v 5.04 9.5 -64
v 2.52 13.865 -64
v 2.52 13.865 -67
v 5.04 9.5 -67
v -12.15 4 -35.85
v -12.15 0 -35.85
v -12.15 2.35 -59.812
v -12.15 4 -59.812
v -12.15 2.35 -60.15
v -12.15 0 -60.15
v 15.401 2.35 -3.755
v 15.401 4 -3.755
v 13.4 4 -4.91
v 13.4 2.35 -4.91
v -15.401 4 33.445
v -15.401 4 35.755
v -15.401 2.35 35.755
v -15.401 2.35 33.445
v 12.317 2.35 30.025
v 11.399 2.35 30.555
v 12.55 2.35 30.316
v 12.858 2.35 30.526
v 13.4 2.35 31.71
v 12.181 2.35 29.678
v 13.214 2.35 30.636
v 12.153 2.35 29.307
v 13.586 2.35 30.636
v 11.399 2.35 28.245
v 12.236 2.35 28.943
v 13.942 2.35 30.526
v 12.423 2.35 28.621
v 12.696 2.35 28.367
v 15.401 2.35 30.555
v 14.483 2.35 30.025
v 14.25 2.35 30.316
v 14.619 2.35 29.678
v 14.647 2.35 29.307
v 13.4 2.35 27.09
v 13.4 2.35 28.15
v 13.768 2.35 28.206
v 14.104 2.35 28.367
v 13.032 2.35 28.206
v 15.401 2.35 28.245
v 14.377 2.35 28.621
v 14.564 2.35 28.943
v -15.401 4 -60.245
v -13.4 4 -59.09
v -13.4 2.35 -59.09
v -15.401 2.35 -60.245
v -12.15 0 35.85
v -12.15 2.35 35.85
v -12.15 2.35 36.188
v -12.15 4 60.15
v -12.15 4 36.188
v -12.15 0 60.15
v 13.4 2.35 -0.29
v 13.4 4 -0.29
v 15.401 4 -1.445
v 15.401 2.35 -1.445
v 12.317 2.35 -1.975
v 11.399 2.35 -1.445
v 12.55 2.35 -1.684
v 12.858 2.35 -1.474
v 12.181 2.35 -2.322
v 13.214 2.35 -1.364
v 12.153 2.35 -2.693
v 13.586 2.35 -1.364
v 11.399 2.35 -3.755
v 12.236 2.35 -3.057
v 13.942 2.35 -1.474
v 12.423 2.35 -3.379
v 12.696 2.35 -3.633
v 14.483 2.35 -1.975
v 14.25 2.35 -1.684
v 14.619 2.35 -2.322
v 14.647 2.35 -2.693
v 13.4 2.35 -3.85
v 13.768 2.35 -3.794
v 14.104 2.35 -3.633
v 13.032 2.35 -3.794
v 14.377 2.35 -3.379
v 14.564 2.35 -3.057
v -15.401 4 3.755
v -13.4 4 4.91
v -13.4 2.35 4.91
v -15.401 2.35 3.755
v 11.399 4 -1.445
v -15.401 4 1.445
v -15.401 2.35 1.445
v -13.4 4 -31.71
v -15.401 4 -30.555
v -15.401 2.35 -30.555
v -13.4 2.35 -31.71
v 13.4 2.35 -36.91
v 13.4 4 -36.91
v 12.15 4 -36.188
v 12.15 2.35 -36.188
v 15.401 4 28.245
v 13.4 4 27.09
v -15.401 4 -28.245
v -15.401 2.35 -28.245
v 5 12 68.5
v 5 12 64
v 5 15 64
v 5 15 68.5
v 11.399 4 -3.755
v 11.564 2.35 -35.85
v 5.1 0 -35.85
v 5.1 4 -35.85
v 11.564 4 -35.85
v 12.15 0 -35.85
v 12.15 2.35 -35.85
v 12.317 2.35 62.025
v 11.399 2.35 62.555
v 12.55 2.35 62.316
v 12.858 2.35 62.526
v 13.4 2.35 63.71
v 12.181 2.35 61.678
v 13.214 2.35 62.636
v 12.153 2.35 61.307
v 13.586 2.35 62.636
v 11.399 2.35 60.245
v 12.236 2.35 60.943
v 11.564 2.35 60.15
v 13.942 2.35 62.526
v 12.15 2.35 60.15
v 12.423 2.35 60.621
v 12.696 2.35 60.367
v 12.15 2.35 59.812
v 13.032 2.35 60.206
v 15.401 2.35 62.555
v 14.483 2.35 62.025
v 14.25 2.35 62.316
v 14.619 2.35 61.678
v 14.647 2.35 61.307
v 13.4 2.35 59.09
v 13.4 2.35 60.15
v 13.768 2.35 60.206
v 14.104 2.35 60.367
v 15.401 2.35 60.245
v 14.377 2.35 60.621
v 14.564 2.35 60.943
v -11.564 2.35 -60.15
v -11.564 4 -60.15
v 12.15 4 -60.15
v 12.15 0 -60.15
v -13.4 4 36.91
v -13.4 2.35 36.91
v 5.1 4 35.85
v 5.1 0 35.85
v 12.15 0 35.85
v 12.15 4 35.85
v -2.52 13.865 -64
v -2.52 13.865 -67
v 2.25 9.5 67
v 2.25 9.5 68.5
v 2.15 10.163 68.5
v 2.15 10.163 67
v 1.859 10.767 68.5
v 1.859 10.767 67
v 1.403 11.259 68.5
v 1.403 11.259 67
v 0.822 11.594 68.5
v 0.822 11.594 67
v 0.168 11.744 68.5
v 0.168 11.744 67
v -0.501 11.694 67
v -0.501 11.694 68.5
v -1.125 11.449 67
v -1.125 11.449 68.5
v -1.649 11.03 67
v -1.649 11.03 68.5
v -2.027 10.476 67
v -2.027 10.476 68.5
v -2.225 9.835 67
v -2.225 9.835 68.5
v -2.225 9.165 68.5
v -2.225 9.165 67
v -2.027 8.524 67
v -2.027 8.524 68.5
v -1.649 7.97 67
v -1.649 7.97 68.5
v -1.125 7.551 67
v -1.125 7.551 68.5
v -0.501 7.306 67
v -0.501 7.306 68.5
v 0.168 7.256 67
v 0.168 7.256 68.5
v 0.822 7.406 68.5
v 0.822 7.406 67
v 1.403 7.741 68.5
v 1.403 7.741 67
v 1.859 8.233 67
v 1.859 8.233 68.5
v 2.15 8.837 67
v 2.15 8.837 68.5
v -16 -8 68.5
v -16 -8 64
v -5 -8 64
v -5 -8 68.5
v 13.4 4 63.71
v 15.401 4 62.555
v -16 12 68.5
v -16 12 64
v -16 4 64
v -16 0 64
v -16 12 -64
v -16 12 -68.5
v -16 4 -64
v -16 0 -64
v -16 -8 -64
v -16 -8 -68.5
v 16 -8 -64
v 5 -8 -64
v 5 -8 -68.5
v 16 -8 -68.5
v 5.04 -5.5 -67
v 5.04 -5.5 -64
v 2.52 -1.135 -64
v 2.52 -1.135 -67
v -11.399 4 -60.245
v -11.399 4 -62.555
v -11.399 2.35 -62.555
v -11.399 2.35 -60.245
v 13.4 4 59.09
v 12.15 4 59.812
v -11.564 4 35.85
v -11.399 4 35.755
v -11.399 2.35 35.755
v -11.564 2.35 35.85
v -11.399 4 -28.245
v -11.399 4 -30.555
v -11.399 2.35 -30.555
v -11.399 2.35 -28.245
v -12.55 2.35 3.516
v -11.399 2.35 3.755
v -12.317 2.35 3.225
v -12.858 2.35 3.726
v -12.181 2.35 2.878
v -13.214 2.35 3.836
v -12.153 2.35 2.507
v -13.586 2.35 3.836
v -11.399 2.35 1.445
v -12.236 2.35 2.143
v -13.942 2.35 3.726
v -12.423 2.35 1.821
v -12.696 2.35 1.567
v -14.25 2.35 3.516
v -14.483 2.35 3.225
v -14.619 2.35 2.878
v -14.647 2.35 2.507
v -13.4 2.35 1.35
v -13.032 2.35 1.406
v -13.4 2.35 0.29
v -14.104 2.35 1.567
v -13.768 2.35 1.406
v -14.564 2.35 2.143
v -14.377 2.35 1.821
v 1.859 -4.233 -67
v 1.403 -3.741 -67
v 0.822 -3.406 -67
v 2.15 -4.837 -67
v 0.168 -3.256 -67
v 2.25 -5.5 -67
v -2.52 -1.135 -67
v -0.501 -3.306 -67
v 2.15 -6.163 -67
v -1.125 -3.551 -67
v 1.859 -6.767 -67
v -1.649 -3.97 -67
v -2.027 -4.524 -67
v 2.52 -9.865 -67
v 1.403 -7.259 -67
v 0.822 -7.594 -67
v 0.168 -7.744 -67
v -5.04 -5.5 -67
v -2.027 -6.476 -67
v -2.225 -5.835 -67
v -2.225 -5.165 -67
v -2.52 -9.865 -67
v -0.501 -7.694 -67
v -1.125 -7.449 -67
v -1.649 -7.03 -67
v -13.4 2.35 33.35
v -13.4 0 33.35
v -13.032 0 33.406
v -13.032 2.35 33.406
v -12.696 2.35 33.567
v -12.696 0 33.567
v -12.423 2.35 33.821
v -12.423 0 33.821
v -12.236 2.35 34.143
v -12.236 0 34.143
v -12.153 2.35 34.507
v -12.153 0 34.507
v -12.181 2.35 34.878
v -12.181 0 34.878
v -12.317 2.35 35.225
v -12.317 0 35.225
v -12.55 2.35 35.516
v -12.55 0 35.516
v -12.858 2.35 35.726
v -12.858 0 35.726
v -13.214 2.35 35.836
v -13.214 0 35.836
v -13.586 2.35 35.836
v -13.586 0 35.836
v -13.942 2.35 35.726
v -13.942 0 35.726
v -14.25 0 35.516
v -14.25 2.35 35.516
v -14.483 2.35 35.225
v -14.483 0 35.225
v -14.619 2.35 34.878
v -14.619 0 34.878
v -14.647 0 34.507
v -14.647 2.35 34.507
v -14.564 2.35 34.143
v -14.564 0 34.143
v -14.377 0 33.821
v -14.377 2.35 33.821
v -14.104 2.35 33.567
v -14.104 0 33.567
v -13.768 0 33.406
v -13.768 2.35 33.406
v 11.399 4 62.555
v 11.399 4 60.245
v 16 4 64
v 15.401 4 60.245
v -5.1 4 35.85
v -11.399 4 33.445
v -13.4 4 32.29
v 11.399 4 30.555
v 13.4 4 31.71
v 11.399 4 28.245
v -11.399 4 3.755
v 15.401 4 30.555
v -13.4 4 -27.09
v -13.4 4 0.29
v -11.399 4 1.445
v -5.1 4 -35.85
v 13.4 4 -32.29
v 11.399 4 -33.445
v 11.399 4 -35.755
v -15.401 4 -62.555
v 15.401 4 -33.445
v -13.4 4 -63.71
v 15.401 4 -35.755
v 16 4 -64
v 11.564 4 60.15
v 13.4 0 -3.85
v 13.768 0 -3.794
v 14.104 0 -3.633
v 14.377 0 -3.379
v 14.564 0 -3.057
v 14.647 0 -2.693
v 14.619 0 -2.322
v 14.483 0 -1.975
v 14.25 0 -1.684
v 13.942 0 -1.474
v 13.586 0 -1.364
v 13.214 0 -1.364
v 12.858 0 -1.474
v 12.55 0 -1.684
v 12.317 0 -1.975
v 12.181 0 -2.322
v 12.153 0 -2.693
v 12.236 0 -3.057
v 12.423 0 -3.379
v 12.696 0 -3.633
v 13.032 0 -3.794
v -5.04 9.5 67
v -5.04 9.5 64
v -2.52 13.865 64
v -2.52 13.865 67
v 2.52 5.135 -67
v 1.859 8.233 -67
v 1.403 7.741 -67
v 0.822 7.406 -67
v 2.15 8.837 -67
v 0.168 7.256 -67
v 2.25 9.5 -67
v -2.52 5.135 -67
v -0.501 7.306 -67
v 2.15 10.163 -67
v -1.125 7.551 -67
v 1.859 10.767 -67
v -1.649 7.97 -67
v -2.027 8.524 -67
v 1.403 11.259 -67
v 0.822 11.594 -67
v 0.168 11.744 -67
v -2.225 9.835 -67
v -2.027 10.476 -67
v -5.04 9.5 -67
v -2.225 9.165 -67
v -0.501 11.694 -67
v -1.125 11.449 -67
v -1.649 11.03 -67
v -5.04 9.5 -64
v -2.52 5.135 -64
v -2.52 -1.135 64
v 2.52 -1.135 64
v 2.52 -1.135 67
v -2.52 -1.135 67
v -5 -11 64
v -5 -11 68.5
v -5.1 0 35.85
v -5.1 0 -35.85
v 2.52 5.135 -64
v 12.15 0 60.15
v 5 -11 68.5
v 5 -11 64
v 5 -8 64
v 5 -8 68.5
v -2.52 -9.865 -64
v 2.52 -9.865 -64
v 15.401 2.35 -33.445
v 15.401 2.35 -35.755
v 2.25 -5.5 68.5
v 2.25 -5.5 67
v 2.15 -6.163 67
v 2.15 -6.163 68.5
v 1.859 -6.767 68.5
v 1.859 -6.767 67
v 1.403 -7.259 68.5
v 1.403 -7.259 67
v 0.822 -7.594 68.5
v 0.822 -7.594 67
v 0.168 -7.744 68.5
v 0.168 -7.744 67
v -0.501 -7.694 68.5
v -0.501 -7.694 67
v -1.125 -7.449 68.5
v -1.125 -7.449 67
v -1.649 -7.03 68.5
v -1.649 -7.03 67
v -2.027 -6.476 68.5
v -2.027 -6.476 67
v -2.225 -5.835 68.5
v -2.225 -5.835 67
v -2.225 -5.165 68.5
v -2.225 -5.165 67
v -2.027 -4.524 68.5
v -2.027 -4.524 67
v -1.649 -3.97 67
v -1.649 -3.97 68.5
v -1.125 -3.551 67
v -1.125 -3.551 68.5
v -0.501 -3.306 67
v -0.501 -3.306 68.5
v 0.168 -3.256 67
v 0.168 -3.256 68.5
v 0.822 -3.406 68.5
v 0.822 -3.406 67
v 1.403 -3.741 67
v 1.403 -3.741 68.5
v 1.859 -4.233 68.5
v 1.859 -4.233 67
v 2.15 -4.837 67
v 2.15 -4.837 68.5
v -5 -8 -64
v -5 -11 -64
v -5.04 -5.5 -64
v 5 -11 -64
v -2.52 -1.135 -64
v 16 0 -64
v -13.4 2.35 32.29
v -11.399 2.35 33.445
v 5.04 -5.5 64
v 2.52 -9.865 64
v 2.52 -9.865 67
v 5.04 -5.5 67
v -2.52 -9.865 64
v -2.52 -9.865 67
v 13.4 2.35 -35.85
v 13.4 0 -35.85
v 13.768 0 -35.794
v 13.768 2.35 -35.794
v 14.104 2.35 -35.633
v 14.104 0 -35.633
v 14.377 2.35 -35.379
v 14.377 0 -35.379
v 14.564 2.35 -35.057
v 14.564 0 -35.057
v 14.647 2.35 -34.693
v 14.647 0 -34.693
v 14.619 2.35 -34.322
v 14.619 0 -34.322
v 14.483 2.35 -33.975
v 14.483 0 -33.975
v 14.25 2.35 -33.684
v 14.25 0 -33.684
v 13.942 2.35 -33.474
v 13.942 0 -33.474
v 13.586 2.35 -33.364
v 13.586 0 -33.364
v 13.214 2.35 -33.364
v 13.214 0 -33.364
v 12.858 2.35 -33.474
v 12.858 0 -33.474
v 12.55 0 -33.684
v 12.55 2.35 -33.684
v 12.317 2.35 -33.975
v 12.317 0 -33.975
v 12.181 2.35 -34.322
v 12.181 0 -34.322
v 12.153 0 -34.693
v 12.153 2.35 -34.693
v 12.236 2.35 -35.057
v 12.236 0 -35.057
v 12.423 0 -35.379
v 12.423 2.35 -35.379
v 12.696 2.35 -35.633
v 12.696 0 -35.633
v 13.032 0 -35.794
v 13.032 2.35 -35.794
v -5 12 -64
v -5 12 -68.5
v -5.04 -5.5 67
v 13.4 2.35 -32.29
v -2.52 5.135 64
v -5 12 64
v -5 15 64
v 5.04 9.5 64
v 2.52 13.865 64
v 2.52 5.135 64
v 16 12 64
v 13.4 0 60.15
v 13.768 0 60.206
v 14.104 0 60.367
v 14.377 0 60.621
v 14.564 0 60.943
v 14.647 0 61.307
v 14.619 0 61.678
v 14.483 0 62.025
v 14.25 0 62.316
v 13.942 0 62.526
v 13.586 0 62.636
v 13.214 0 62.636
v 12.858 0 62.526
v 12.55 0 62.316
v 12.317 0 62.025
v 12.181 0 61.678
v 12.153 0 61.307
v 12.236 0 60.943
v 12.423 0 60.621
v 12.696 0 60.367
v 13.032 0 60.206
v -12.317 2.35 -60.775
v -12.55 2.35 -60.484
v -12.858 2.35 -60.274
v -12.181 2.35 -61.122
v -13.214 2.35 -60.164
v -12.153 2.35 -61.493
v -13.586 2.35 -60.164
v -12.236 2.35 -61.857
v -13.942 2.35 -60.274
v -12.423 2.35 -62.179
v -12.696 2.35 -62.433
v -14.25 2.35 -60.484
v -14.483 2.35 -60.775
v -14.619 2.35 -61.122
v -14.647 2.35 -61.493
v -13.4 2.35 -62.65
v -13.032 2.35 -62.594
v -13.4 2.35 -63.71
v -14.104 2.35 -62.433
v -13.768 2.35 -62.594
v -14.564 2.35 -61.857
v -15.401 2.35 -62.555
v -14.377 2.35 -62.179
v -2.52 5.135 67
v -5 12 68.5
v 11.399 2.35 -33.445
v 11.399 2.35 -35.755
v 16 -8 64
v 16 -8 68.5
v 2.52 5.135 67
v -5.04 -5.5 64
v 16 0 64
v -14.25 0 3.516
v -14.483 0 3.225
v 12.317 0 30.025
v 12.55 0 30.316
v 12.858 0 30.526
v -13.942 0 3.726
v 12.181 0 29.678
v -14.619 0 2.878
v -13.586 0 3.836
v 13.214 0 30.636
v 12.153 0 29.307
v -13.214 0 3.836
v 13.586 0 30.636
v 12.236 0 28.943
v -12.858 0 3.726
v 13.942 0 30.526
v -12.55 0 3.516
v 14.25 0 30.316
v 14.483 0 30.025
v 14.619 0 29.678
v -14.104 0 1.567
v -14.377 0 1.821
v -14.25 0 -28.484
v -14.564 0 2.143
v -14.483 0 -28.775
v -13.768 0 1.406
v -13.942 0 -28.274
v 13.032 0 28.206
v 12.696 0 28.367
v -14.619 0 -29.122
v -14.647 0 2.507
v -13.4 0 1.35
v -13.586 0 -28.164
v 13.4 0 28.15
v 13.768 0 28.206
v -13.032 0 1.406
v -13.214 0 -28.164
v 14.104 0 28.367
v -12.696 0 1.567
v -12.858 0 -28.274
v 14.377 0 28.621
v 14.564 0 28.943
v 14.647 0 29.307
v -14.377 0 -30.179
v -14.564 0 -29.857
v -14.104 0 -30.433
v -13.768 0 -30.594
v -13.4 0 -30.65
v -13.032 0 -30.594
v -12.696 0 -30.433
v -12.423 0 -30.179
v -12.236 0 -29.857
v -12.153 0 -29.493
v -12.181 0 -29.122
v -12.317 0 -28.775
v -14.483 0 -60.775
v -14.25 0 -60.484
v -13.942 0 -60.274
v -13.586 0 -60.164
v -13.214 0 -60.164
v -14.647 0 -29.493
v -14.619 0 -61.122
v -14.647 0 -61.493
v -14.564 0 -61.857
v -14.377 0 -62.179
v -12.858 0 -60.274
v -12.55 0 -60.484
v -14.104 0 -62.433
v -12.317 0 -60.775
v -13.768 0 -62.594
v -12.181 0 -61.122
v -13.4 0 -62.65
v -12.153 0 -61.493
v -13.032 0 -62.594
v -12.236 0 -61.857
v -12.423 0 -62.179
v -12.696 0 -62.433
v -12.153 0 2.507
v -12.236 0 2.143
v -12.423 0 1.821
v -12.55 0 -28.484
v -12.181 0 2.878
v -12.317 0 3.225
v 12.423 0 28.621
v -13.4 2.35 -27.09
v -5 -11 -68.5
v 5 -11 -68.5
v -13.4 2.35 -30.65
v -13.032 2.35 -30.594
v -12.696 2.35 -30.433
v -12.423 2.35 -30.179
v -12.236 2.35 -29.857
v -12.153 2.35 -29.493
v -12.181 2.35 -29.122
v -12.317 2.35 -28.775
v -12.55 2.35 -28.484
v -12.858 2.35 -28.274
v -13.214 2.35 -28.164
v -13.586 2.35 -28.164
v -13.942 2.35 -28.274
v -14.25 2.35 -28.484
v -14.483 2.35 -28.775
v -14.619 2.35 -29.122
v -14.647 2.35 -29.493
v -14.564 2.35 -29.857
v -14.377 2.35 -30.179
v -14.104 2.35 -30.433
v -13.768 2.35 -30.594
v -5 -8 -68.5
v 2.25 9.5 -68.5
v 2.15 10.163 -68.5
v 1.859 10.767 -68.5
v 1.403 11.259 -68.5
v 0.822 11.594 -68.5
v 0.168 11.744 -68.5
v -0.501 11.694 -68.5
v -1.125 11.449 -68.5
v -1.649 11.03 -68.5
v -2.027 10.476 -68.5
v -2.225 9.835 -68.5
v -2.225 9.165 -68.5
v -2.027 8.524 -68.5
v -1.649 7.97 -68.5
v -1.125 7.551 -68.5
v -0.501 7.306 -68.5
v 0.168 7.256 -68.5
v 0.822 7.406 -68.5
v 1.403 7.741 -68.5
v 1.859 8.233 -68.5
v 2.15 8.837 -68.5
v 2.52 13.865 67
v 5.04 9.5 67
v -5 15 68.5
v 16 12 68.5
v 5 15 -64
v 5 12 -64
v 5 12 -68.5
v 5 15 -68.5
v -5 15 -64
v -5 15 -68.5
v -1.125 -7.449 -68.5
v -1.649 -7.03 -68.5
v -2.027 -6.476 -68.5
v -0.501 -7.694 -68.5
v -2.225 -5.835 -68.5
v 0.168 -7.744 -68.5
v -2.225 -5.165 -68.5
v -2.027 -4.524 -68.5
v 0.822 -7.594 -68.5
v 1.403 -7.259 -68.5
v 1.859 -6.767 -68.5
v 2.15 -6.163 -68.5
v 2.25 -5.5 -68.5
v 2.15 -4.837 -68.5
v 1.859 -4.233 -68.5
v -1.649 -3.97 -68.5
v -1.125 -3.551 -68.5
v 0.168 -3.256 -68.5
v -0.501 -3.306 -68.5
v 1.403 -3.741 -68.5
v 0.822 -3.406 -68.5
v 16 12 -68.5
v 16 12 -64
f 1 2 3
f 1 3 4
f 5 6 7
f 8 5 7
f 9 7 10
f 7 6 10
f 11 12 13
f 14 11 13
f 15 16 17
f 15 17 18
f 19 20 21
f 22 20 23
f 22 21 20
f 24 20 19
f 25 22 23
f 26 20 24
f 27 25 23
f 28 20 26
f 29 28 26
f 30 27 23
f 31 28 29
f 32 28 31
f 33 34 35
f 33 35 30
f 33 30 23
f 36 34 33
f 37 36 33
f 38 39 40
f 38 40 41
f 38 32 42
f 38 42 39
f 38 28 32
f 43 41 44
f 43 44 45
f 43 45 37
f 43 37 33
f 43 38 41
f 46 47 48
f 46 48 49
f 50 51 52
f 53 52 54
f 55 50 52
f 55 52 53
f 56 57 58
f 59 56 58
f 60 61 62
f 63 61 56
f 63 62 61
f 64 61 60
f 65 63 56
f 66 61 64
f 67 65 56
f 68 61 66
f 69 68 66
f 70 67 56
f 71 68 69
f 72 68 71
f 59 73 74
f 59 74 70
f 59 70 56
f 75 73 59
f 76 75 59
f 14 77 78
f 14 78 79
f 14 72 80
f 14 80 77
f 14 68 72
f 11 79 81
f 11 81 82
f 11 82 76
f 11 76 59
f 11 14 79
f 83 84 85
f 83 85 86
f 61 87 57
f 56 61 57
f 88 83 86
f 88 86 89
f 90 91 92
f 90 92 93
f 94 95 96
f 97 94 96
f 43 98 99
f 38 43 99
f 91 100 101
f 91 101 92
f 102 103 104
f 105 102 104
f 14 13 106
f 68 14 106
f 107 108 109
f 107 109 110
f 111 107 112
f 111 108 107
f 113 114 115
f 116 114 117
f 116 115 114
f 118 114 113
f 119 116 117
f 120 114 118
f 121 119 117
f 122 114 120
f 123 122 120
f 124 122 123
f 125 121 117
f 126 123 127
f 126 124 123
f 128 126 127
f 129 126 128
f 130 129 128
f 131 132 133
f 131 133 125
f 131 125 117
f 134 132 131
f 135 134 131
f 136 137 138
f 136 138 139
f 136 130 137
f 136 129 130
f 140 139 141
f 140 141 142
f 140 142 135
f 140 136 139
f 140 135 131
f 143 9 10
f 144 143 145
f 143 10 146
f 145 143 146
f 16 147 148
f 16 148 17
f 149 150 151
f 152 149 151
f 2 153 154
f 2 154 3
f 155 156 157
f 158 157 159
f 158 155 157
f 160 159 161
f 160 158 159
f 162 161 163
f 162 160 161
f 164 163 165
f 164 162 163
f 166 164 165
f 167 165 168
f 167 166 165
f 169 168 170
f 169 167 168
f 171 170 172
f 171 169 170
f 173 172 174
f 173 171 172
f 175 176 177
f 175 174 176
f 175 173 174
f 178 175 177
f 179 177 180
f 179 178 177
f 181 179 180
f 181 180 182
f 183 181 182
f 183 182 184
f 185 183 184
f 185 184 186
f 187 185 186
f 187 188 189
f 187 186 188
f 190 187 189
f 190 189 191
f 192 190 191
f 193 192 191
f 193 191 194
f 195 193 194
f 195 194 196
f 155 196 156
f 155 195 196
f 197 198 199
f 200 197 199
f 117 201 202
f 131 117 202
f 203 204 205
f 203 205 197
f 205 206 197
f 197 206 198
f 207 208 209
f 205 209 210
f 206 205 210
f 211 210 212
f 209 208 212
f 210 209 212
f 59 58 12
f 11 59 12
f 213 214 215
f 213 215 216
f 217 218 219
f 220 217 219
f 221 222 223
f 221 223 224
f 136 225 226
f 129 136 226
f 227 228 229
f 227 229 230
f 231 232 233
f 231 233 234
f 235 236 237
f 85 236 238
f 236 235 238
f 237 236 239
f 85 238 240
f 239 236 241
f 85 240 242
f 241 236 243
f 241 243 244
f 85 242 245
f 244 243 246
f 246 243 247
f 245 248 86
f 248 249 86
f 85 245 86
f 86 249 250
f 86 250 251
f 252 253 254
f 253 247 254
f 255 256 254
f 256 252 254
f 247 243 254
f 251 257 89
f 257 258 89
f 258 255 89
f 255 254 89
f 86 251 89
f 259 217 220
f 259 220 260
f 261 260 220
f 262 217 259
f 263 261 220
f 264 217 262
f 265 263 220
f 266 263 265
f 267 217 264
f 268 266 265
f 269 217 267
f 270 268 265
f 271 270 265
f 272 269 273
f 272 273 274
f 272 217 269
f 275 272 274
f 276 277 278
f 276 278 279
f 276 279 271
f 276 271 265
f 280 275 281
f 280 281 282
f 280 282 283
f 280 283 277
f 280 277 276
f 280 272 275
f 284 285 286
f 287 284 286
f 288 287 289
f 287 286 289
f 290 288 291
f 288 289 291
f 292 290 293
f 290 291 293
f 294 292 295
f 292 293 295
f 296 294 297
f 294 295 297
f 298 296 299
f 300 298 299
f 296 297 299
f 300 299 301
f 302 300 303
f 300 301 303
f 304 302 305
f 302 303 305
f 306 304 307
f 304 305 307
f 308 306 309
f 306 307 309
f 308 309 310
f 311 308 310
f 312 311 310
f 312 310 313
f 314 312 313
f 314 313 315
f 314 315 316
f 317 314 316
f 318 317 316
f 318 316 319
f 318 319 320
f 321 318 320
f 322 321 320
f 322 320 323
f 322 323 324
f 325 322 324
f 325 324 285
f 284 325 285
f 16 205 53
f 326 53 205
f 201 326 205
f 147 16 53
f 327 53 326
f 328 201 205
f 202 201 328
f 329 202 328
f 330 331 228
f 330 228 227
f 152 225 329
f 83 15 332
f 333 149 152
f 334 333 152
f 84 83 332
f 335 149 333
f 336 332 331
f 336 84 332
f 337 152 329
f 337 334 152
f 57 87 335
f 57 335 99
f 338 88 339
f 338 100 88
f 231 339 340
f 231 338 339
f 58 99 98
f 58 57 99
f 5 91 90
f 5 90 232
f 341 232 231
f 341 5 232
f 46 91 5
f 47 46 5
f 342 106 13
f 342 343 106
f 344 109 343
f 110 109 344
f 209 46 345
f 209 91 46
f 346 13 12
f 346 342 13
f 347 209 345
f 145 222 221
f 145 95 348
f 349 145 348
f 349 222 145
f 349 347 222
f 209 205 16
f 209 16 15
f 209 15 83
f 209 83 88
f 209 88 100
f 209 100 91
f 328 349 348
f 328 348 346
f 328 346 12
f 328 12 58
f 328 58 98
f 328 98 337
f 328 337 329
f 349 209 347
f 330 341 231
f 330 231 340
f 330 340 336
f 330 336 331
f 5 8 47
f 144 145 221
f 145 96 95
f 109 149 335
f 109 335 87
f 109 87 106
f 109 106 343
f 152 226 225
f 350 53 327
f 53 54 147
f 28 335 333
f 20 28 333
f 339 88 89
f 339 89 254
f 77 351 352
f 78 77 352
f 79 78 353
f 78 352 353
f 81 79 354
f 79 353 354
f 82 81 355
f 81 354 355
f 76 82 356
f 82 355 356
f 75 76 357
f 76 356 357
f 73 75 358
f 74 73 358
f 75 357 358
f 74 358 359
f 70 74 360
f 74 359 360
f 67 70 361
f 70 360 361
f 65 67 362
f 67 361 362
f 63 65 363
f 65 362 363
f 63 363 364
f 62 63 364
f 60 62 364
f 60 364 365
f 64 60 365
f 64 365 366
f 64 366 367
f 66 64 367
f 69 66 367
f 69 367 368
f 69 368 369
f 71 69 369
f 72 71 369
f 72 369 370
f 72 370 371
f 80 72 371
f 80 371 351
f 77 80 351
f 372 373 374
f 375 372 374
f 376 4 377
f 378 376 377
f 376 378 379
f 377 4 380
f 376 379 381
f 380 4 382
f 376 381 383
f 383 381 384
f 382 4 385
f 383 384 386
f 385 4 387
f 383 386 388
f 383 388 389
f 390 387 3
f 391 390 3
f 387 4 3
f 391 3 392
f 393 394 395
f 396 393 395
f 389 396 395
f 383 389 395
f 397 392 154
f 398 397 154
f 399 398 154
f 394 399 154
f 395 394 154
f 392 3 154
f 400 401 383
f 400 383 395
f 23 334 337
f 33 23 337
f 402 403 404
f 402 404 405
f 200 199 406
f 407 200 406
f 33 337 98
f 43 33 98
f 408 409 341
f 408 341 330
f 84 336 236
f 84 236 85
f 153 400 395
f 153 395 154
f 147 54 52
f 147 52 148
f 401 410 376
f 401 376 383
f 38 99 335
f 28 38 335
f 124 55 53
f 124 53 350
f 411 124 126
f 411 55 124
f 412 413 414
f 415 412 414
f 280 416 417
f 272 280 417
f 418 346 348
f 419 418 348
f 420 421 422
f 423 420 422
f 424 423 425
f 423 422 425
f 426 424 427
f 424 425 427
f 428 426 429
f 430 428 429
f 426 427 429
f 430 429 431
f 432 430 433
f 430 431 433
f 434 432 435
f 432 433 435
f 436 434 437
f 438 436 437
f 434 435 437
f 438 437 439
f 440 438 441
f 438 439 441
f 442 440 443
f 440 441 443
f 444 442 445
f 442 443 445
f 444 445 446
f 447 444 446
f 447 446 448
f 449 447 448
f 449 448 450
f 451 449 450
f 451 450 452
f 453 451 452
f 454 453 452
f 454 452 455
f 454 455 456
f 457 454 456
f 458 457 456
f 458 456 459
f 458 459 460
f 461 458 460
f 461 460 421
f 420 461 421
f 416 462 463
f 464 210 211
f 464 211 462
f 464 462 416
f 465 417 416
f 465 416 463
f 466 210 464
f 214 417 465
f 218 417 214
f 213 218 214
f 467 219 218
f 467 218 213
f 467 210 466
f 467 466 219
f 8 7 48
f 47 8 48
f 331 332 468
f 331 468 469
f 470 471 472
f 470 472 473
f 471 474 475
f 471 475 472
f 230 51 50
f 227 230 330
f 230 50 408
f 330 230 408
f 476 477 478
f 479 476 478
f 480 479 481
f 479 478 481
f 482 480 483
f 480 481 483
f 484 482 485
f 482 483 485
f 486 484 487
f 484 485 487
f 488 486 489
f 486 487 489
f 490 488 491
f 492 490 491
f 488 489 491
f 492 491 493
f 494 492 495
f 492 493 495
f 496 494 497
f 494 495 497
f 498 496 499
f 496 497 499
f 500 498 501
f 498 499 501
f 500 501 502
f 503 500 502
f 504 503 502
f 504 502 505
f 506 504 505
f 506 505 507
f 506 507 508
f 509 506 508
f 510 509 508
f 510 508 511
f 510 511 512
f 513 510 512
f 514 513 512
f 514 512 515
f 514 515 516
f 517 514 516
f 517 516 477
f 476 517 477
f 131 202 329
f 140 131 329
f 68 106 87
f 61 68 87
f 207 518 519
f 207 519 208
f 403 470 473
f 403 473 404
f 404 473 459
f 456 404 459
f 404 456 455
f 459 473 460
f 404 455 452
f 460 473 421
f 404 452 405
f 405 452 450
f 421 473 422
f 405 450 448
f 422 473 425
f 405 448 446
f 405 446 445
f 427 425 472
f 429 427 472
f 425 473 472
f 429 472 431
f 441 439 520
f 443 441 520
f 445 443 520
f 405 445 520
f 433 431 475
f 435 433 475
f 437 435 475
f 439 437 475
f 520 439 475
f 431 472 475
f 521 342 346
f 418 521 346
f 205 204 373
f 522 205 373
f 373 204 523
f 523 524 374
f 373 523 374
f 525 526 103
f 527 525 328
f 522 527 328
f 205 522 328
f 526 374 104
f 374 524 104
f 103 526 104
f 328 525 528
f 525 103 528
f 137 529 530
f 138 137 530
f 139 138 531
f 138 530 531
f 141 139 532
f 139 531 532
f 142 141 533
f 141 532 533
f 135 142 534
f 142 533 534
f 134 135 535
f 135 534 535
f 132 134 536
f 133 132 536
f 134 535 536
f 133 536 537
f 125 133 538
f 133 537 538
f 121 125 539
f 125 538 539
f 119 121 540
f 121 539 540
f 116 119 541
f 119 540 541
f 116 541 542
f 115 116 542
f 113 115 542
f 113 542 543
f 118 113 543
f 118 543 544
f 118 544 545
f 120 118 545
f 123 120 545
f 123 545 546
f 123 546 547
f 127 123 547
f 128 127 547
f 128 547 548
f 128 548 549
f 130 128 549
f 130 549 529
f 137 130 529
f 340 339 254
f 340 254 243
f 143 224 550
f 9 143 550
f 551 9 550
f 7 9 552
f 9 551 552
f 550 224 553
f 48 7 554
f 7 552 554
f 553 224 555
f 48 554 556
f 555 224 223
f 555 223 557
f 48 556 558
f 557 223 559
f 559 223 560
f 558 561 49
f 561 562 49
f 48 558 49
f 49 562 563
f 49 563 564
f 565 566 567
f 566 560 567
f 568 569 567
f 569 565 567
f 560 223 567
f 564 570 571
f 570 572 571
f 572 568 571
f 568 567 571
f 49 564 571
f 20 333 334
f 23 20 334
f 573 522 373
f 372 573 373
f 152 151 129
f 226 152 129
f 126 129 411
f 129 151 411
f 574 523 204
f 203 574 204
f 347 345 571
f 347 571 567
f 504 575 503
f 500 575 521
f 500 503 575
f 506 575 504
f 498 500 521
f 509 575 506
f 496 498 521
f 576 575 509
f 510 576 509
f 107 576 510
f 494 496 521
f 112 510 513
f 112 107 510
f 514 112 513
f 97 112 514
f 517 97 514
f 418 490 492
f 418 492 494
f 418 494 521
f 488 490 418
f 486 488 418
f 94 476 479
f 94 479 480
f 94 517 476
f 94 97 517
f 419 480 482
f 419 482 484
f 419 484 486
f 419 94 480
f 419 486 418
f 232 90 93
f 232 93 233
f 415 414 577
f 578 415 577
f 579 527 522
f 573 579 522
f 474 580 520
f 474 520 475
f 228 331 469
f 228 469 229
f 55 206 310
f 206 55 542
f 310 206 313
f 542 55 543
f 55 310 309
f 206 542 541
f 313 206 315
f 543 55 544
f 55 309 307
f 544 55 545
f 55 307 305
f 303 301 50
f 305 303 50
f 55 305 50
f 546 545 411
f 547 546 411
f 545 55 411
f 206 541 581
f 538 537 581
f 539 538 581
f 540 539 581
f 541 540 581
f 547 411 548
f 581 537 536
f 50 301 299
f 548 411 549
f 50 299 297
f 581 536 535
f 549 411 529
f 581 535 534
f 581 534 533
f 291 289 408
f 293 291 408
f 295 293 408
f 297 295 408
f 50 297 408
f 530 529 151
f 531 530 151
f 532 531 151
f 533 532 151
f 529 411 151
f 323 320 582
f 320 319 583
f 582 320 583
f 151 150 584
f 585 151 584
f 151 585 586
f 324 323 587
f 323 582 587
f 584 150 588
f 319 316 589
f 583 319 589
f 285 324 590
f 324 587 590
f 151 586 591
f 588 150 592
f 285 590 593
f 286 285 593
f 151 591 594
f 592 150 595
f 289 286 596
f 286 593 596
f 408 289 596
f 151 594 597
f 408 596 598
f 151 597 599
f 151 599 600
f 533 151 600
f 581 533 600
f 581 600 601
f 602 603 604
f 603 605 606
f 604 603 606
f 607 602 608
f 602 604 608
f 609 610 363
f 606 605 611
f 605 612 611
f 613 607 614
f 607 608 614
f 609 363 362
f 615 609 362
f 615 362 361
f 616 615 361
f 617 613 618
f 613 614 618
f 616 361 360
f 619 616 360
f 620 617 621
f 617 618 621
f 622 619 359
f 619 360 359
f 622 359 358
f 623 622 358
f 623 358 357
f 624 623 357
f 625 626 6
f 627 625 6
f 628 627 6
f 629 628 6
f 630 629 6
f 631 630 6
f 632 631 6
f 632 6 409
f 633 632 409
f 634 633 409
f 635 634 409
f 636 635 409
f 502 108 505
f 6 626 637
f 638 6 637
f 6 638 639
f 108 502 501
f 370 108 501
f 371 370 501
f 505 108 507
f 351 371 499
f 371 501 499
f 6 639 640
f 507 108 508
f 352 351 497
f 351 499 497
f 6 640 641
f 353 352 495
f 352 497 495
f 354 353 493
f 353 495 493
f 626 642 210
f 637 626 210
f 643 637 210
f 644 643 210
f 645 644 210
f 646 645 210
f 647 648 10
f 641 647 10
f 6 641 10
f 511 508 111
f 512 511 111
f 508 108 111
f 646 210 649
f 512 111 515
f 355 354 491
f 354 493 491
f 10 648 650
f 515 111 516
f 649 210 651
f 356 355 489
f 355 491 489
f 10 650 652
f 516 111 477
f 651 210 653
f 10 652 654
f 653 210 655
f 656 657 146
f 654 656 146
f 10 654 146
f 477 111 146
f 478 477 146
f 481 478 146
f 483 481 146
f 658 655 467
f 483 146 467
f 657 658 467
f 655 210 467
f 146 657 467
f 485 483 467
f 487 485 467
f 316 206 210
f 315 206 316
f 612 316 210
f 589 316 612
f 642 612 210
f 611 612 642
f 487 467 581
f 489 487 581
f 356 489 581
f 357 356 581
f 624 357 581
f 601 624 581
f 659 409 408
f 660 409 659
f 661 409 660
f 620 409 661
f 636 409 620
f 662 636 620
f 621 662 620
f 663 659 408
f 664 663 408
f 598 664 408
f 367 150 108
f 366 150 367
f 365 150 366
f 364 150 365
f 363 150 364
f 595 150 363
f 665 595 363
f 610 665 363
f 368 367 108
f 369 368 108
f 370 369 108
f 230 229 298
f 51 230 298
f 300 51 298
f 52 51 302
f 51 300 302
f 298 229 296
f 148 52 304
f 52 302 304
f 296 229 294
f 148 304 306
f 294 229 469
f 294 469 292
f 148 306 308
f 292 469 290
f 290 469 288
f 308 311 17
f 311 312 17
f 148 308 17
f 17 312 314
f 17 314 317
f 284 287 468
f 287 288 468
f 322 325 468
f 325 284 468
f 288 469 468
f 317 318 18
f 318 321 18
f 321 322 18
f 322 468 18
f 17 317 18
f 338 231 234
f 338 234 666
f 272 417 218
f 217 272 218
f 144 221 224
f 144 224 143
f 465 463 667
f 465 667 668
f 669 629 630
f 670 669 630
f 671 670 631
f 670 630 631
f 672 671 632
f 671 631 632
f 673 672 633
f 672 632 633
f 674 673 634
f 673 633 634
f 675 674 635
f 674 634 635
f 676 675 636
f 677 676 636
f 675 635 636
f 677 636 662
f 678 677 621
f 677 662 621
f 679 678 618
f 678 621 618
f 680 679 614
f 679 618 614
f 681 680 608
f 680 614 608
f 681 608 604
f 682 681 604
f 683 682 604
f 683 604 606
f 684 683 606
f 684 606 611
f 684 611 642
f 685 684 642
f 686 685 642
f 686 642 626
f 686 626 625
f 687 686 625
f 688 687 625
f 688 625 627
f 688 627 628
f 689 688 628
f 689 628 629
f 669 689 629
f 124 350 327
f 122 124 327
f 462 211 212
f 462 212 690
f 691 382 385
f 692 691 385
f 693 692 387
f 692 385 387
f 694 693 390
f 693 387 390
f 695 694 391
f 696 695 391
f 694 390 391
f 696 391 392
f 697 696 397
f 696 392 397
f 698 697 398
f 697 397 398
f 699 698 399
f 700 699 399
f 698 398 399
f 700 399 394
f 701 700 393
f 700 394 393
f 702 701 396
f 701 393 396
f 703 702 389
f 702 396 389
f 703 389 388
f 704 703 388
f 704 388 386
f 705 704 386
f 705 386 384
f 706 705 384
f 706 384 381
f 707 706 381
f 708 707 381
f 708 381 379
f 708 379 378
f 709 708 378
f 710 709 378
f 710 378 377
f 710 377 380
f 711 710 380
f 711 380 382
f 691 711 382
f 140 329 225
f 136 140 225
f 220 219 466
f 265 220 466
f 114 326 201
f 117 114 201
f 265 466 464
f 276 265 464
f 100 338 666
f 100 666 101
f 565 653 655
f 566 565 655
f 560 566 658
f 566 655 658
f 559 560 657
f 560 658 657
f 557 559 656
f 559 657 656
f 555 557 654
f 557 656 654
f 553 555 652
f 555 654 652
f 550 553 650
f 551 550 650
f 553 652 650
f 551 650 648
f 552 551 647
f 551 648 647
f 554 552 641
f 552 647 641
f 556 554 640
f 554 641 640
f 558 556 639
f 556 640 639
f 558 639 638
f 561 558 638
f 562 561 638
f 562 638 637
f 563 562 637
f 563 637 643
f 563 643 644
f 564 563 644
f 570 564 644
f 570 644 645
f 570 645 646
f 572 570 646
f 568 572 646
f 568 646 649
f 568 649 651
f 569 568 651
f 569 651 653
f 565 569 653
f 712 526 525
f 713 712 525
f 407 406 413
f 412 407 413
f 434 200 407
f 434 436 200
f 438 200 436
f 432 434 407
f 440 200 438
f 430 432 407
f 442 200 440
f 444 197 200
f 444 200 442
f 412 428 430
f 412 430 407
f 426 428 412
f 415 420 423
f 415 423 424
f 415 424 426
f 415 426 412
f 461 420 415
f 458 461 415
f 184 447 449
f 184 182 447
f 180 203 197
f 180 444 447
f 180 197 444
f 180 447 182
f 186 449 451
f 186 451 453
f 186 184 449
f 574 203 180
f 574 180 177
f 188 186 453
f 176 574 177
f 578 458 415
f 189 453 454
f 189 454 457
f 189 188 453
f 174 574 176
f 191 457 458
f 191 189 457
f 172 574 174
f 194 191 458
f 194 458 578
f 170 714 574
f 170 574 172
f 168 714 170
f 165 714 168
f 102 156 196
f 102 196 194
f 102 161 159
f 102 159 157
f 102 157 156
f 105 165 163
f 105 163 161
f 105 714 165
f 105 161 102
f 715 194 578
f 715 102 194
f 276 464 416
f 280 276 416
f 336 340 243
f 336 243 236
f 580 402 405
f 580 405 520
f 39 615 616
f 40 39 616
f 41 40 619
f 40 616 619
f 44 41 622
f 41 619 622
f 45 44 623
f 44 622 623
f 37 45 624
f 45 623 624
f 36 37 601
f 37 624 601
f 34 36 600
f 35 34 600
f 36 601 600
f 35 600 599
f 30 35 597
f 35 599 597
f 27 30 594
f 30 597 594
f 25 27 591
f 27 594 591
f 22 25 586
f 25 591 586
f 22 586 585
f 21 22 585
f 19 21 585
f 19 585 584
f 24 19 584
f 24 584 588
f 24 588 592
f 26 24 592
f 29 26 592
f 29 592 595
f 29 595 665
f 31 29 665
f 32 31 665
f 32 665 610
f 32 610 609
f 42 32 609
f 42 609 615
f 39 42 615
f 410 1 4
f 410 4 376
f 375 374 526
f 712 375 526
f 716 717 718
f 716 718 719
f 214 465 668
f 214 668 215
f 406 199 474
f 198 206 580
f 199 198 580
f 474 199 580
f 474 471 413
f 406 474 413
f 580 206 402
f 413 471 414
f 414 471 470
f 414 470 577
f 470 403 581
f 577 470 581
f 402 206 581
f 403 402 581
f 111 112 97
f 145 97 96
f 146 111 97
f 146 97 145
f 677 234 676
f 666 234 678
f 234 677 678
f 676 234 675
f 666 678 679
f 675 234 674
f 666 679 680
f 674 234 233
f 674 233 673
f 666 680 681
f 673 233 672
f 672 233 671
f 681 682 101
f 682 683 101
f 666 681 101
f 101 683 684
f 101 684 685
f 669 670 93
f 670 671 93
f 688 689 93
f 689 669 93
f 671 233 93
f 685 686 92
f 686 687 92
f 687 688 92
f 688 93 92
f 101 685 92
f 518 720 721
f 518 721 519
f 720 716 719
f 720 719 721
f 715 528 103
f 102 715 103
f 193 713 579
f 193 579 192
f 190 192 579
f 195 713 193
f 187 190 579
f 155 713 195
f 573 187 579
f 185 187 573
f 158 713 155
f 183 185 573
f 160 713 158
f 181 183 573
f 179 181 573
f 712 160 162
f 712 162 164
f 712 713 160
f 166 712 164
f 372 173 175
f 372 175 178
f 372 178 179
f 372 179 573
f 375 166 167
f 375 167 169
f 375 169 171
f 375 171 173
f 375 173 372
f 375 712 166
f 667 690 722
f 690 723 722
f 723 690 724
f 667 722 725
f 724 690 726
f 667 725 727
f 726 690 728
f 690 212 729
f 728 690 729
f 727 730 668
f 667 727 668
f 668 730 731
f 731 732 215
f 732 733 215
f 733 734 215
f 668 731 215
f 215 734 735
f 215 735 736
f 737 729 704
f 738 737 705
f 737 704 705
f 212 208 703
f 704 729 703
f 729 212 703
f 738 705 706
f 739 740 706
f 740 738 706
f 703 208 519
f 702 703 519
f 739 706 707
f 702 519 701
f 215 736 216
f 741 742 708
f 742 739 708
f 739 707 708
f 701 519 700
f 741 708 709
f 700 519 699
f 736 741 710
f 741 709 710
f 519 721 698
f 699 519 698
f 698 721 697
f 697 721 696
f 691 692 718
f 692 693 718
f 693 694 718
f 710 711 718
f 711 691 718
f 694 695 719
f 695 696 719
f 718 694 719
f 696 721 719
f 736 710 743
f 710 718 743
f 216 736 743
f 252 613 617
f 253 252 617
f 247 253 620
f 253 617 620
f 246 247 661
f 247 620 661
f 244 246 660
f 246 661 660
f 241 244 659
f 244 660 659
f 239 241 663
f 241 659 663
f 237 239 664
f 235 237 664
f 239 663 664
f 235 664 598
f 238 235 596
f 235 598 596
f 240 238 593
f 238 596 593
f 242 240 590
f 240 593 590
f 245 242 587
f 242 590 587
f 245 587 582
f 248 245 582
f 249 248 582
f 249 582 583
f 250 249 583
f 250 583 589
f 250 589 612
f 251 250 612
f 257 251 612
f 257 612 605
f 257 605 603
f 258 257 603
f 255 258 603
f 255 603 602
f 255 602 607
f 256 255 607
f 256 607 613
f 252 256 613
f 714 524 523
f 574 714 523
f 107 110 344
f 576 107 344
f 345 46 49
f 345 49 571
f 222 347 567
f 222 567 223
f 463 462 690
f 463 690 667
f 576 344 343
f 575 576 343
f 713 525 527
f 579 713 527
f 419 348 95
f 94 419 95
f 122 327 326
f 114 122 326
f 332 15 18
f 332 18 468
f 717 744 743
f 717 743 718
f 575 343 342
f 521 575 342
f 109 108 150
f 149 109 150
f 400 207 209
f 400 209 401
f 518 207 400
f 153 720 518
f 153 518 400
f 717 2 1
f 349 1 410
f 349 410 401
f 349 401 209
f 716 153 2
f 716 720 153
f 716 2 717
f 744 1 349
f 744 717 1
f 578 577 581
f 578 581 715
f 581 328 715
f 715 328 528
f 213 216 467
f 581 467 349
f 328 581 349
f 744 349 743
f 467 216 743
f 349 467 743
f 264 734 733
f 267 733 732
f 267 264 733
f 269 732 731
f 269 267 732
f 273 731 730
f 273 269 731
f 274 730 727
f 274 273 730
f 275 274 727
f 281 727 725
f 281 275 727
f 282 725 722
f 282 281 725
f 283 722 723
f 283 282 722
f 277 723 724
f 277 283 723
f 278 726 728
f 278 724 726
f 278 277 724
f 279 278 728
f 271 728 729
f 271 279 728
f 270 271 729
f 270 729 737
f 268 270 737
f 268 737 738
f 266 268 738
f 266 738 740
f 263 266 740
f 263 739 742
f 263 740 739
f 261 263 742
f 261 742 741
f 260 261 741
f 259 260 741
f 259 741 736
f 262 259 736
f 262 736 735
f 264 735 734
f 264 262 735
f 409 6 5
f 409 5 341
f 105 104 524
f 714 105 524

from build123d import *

# Parameters (mm, degrees)
SKETCH1_W               = 32
SKETCH1_H               = 128
BOSS_EXTRUDE1_DEPTH     = 4
SKETCH4_R               = 1.25
CUT_EXTRUDE2_DEPTH      = 10
SKETCH5_R               = 1.25
CUT_EXTRUDE3_DEPTH      = 10
CUT_EXTRUDE4_DEPTH      = 1.65
LPATTERN3_COUNT         = 4
LPATTERN3_PITCH         = 32
CUT_EXTRUDE5_DEPTH      = 1.65
LPATTERN4_COUNT         = 4
LPATTERN4_PITCH         = 32
SKETCH8_W               = 24.3
SKETCH8_H               = 24.3
CUT_EXTRUDE6_DEPTH      = 10
BOSS_EXTRUDE2_DEPTH     = 4.5
SKETCH11_W              = 10.2
SKETCH11_H              = 71.7
CUT_EXTRUDE7_DEPTH      = 72.92530848
CUT_EXTRUDE8_DEPTH      = 3
SKETCH12_R              = 2.25
CUT_EXTRUDE9_DEPTH      = 3
MIRROR3_COPY_1_DEPTH    = 3
MIRROR3_COPY_2_SKETCH_R = 2.25
MIRROR3_COPY_2_DEPTH    = 3


with BuildPart() as part:
    # Sketch1 → Boss-Extrude1 (new body)
    with BuildSketch(Plane(origin=(0, 0, 0), x_dir=(1, 0, 0), z_dir=(0, 1, 0))):
        Rectangle(SKETCH1_W, SKETCH1_H)
    extrude(amount=BOSS_EXTRUDE1_DEPTH)

    # Sketch4 → Cut-Extrude2 (cut)
    with BuildSketch(Plane.XZ):
        with Locations(Location((13.4, 61.4, 0), (0, 0, 270))):
            Circle(SKETCH4_R)
    cut_extrude2 = extrude(amount=-CUT_EXTRUDE2_DEPTH, mode=Mode.SUBTRACT)

    # Sketch5 → Cut-Extrude3 (cut)
    with BuildSketch(Plane.XZ):
        with Locations(Location((-13.4, -61.4, 0), (0, 0, 270))):
            Circle(SKETCH5_R)
    cut_extrude3 = extrude(amount=-CUT_EXTRUDE3_DEPTH, mode=Mode.SUBTRACT)

    # Sketch6 → Cut-Extrude4 (cut)
    with BuildSketch(Plane(origin=(0, 4, 0), x_dir=(1, 0, 0), z_dir=(0, 1, 0))):
        Polygon((-15.400518683, 62.555), (-13.4, 63.71), (-11.399481317, 62.555), (-11.399481317, 60.245), (-13.4, 59.09), (-15.400518683, 60.245), align=None)
    cut_extrude4 = extrude(amount=-CUT_EXTRUDE4_DEPTH, mode=Mode.SUBTRACT)

    # LPattern3: Cut-Extrude3, Cut-Extrude4 ×4
    with Locations(*[(0, 0, i * LPATTERN3_PITCH) for i in range(1, LPATTERN3_COUNT)]):
        add(cut_extrude3, mode=Mode.SUBTRACT)
        add(cut_extrude4, mode=Mode.SUBTRACT)

    # Sketch7 → Cut-Extrude5 (cut)
    with BuildSketch(Plane(origin=(0, 4, 0), x_dir=(1, 0, 0), z_dir=(0, 1, 0))):
        Polygon((13.4, -59.09), (11.399481317, -60.245), (11.399481317, -62.555), (13.4, -63.71), (15.400518683, -62.555), (15.400518683, -60.245), align=None)
    cut_extrude5 = extrude(amount=-CUT_EXTRUDE5_DEPTH, mode=Mode.SUBTRACT)

    # LPattern4: Cut-Extrude2, Cut-Extrude5 ×4
    with Locations(*[(0, 0, -i * LPATTERN4_PITCH) for i in range(1, LPATTERN4_COUNT)]):
        add(cut_extrude2, mode=Mode.SUBTRACT)
        add(cut_extrude5, mode=Mode.SUBTRACT)

    # Sketch8 → Cut-Extrude6 (cut)
    with BuildSketch(Plane.XZ):
        with Locations((0, 48)):
            Rectangle(SKETCH8_W, SKETCH8_H)
    cut_extrude6 = extrude(amount=-CUT_EXTRUDE6_DEPTH, mode=Mode.SUBTRACT)

    # Mirror1: Cut-Extrude6 across plane
    add(cut_extrude6.mirror(Plane.XY), mode=Mode.SUBTRACT)

    # Sketch9 → Boss-Extrude2 (add)
    with BuildSketch(Plane(origin=(0, 0, -64), x_dir=(-1, 0, 0), z_dir=(0, 0, -1))):
        Polygon((-16, 12), (-5, 12), (-5, 15), (5, 15), (5, 12), (16, 12), (16, -8), (5, -8), (5, -11), (-5, -11), (-5, -8), (-16, -8), align=None)
    boss_extrude2 = extrude(amount=BOSS_EXTRUDE2_DEPTH)

    # Sketch11 → Cut-Extrude7 (cut, through all)
    with BuildSketch(Plane.XZ):
        Rectangle(SKETCH11_W, SKETCH11_H)
    extrude(amount=-CUT_EXTRUDE7_DEPTH, mode=Mode.SUBTRACT)

    # Sketch10 → Cut-Extrude8 (cut)
    with BuildSketch(Plane.XY.offset(-64)):
        Polygon((-2.52, 13.864768035), (2.52, 13.864768035), (5.04, 9.5), (2.52, 5.135231965), (-2.52, 5.135231965), (-5.04, 9.5), align=None)
    cut_extrude8 = extrude(amount=-CUT_EXTRUDE8_DEPTH, mode=Mode.SUBTRACT)

    # Sketch12 → Cut-Extrude9 (cut)
    with BuildSketch(Plane.XY.offset(-67)):
        with Locations((0, 9.5)):
            Circle(SKETCH12_R)
    cut_extrude9 = extrude(amount=-CUT_EXTRUDE9_DEPTH, mode=Mode.SUBTRACT)

    # Mirror2: Cut-Extrude8, Cut-Extrude9 across plane
    add(cut_extrude8.mirror(Plane.ZX.offset(2)), mode=Mode.SUBTRACT)
    add(cut_extrude9.mirror(Plane.ZX.offset(2)), mode=Mode.SUBTRACT)

    # Mirror3: Boss-Extrude2, Cut-Extrude8, Cut-Extrude9 across plane
    add(boss_extrude2.mirror(Plane.XY))
    add(cut_extrude8.mirror(Plane.XY), mode=Mode.SUBTRACT)
    add(cut_extrude9.mirror(Plane.XY), mode=Mode.SUBTRACT)

    # Mirror3 copy 1 sketch → Mirror3 copy 1 (cut)
    with BuildSketch(Plane(origin=(0, 4, 64), x_dir=(1, 0, 0), z_dir=(0, 0, -1))):
        Polygon((-2.52, 13.864768035), (2.52, 13.864768035), (5.04, 9.5), (2.52, 5.135231965), (-2.52, 5.135231965), (-5.04, 9.5), align=None)
    extrude(amount=-MIRROR3_COPY_1_DEPTH, mode=Mode.SUBTRACT)

    # Mirror3 copy 2 sketch → Mirror3 copy 2 (cut)
    with BuildSketch(Plane(origin=(0, 4, 67), x_dir=(1, 0, 0), z_dir=(0, 0, -1))):
        with Locations((0, 9.5)):
            Circle(MIRROR3_COPY_2_SKETCH_R)
    extrude(amount=-MIRROR3_COPY_2_DEPTH, mode=Mode.SUBTRACT)


solid = part.part
